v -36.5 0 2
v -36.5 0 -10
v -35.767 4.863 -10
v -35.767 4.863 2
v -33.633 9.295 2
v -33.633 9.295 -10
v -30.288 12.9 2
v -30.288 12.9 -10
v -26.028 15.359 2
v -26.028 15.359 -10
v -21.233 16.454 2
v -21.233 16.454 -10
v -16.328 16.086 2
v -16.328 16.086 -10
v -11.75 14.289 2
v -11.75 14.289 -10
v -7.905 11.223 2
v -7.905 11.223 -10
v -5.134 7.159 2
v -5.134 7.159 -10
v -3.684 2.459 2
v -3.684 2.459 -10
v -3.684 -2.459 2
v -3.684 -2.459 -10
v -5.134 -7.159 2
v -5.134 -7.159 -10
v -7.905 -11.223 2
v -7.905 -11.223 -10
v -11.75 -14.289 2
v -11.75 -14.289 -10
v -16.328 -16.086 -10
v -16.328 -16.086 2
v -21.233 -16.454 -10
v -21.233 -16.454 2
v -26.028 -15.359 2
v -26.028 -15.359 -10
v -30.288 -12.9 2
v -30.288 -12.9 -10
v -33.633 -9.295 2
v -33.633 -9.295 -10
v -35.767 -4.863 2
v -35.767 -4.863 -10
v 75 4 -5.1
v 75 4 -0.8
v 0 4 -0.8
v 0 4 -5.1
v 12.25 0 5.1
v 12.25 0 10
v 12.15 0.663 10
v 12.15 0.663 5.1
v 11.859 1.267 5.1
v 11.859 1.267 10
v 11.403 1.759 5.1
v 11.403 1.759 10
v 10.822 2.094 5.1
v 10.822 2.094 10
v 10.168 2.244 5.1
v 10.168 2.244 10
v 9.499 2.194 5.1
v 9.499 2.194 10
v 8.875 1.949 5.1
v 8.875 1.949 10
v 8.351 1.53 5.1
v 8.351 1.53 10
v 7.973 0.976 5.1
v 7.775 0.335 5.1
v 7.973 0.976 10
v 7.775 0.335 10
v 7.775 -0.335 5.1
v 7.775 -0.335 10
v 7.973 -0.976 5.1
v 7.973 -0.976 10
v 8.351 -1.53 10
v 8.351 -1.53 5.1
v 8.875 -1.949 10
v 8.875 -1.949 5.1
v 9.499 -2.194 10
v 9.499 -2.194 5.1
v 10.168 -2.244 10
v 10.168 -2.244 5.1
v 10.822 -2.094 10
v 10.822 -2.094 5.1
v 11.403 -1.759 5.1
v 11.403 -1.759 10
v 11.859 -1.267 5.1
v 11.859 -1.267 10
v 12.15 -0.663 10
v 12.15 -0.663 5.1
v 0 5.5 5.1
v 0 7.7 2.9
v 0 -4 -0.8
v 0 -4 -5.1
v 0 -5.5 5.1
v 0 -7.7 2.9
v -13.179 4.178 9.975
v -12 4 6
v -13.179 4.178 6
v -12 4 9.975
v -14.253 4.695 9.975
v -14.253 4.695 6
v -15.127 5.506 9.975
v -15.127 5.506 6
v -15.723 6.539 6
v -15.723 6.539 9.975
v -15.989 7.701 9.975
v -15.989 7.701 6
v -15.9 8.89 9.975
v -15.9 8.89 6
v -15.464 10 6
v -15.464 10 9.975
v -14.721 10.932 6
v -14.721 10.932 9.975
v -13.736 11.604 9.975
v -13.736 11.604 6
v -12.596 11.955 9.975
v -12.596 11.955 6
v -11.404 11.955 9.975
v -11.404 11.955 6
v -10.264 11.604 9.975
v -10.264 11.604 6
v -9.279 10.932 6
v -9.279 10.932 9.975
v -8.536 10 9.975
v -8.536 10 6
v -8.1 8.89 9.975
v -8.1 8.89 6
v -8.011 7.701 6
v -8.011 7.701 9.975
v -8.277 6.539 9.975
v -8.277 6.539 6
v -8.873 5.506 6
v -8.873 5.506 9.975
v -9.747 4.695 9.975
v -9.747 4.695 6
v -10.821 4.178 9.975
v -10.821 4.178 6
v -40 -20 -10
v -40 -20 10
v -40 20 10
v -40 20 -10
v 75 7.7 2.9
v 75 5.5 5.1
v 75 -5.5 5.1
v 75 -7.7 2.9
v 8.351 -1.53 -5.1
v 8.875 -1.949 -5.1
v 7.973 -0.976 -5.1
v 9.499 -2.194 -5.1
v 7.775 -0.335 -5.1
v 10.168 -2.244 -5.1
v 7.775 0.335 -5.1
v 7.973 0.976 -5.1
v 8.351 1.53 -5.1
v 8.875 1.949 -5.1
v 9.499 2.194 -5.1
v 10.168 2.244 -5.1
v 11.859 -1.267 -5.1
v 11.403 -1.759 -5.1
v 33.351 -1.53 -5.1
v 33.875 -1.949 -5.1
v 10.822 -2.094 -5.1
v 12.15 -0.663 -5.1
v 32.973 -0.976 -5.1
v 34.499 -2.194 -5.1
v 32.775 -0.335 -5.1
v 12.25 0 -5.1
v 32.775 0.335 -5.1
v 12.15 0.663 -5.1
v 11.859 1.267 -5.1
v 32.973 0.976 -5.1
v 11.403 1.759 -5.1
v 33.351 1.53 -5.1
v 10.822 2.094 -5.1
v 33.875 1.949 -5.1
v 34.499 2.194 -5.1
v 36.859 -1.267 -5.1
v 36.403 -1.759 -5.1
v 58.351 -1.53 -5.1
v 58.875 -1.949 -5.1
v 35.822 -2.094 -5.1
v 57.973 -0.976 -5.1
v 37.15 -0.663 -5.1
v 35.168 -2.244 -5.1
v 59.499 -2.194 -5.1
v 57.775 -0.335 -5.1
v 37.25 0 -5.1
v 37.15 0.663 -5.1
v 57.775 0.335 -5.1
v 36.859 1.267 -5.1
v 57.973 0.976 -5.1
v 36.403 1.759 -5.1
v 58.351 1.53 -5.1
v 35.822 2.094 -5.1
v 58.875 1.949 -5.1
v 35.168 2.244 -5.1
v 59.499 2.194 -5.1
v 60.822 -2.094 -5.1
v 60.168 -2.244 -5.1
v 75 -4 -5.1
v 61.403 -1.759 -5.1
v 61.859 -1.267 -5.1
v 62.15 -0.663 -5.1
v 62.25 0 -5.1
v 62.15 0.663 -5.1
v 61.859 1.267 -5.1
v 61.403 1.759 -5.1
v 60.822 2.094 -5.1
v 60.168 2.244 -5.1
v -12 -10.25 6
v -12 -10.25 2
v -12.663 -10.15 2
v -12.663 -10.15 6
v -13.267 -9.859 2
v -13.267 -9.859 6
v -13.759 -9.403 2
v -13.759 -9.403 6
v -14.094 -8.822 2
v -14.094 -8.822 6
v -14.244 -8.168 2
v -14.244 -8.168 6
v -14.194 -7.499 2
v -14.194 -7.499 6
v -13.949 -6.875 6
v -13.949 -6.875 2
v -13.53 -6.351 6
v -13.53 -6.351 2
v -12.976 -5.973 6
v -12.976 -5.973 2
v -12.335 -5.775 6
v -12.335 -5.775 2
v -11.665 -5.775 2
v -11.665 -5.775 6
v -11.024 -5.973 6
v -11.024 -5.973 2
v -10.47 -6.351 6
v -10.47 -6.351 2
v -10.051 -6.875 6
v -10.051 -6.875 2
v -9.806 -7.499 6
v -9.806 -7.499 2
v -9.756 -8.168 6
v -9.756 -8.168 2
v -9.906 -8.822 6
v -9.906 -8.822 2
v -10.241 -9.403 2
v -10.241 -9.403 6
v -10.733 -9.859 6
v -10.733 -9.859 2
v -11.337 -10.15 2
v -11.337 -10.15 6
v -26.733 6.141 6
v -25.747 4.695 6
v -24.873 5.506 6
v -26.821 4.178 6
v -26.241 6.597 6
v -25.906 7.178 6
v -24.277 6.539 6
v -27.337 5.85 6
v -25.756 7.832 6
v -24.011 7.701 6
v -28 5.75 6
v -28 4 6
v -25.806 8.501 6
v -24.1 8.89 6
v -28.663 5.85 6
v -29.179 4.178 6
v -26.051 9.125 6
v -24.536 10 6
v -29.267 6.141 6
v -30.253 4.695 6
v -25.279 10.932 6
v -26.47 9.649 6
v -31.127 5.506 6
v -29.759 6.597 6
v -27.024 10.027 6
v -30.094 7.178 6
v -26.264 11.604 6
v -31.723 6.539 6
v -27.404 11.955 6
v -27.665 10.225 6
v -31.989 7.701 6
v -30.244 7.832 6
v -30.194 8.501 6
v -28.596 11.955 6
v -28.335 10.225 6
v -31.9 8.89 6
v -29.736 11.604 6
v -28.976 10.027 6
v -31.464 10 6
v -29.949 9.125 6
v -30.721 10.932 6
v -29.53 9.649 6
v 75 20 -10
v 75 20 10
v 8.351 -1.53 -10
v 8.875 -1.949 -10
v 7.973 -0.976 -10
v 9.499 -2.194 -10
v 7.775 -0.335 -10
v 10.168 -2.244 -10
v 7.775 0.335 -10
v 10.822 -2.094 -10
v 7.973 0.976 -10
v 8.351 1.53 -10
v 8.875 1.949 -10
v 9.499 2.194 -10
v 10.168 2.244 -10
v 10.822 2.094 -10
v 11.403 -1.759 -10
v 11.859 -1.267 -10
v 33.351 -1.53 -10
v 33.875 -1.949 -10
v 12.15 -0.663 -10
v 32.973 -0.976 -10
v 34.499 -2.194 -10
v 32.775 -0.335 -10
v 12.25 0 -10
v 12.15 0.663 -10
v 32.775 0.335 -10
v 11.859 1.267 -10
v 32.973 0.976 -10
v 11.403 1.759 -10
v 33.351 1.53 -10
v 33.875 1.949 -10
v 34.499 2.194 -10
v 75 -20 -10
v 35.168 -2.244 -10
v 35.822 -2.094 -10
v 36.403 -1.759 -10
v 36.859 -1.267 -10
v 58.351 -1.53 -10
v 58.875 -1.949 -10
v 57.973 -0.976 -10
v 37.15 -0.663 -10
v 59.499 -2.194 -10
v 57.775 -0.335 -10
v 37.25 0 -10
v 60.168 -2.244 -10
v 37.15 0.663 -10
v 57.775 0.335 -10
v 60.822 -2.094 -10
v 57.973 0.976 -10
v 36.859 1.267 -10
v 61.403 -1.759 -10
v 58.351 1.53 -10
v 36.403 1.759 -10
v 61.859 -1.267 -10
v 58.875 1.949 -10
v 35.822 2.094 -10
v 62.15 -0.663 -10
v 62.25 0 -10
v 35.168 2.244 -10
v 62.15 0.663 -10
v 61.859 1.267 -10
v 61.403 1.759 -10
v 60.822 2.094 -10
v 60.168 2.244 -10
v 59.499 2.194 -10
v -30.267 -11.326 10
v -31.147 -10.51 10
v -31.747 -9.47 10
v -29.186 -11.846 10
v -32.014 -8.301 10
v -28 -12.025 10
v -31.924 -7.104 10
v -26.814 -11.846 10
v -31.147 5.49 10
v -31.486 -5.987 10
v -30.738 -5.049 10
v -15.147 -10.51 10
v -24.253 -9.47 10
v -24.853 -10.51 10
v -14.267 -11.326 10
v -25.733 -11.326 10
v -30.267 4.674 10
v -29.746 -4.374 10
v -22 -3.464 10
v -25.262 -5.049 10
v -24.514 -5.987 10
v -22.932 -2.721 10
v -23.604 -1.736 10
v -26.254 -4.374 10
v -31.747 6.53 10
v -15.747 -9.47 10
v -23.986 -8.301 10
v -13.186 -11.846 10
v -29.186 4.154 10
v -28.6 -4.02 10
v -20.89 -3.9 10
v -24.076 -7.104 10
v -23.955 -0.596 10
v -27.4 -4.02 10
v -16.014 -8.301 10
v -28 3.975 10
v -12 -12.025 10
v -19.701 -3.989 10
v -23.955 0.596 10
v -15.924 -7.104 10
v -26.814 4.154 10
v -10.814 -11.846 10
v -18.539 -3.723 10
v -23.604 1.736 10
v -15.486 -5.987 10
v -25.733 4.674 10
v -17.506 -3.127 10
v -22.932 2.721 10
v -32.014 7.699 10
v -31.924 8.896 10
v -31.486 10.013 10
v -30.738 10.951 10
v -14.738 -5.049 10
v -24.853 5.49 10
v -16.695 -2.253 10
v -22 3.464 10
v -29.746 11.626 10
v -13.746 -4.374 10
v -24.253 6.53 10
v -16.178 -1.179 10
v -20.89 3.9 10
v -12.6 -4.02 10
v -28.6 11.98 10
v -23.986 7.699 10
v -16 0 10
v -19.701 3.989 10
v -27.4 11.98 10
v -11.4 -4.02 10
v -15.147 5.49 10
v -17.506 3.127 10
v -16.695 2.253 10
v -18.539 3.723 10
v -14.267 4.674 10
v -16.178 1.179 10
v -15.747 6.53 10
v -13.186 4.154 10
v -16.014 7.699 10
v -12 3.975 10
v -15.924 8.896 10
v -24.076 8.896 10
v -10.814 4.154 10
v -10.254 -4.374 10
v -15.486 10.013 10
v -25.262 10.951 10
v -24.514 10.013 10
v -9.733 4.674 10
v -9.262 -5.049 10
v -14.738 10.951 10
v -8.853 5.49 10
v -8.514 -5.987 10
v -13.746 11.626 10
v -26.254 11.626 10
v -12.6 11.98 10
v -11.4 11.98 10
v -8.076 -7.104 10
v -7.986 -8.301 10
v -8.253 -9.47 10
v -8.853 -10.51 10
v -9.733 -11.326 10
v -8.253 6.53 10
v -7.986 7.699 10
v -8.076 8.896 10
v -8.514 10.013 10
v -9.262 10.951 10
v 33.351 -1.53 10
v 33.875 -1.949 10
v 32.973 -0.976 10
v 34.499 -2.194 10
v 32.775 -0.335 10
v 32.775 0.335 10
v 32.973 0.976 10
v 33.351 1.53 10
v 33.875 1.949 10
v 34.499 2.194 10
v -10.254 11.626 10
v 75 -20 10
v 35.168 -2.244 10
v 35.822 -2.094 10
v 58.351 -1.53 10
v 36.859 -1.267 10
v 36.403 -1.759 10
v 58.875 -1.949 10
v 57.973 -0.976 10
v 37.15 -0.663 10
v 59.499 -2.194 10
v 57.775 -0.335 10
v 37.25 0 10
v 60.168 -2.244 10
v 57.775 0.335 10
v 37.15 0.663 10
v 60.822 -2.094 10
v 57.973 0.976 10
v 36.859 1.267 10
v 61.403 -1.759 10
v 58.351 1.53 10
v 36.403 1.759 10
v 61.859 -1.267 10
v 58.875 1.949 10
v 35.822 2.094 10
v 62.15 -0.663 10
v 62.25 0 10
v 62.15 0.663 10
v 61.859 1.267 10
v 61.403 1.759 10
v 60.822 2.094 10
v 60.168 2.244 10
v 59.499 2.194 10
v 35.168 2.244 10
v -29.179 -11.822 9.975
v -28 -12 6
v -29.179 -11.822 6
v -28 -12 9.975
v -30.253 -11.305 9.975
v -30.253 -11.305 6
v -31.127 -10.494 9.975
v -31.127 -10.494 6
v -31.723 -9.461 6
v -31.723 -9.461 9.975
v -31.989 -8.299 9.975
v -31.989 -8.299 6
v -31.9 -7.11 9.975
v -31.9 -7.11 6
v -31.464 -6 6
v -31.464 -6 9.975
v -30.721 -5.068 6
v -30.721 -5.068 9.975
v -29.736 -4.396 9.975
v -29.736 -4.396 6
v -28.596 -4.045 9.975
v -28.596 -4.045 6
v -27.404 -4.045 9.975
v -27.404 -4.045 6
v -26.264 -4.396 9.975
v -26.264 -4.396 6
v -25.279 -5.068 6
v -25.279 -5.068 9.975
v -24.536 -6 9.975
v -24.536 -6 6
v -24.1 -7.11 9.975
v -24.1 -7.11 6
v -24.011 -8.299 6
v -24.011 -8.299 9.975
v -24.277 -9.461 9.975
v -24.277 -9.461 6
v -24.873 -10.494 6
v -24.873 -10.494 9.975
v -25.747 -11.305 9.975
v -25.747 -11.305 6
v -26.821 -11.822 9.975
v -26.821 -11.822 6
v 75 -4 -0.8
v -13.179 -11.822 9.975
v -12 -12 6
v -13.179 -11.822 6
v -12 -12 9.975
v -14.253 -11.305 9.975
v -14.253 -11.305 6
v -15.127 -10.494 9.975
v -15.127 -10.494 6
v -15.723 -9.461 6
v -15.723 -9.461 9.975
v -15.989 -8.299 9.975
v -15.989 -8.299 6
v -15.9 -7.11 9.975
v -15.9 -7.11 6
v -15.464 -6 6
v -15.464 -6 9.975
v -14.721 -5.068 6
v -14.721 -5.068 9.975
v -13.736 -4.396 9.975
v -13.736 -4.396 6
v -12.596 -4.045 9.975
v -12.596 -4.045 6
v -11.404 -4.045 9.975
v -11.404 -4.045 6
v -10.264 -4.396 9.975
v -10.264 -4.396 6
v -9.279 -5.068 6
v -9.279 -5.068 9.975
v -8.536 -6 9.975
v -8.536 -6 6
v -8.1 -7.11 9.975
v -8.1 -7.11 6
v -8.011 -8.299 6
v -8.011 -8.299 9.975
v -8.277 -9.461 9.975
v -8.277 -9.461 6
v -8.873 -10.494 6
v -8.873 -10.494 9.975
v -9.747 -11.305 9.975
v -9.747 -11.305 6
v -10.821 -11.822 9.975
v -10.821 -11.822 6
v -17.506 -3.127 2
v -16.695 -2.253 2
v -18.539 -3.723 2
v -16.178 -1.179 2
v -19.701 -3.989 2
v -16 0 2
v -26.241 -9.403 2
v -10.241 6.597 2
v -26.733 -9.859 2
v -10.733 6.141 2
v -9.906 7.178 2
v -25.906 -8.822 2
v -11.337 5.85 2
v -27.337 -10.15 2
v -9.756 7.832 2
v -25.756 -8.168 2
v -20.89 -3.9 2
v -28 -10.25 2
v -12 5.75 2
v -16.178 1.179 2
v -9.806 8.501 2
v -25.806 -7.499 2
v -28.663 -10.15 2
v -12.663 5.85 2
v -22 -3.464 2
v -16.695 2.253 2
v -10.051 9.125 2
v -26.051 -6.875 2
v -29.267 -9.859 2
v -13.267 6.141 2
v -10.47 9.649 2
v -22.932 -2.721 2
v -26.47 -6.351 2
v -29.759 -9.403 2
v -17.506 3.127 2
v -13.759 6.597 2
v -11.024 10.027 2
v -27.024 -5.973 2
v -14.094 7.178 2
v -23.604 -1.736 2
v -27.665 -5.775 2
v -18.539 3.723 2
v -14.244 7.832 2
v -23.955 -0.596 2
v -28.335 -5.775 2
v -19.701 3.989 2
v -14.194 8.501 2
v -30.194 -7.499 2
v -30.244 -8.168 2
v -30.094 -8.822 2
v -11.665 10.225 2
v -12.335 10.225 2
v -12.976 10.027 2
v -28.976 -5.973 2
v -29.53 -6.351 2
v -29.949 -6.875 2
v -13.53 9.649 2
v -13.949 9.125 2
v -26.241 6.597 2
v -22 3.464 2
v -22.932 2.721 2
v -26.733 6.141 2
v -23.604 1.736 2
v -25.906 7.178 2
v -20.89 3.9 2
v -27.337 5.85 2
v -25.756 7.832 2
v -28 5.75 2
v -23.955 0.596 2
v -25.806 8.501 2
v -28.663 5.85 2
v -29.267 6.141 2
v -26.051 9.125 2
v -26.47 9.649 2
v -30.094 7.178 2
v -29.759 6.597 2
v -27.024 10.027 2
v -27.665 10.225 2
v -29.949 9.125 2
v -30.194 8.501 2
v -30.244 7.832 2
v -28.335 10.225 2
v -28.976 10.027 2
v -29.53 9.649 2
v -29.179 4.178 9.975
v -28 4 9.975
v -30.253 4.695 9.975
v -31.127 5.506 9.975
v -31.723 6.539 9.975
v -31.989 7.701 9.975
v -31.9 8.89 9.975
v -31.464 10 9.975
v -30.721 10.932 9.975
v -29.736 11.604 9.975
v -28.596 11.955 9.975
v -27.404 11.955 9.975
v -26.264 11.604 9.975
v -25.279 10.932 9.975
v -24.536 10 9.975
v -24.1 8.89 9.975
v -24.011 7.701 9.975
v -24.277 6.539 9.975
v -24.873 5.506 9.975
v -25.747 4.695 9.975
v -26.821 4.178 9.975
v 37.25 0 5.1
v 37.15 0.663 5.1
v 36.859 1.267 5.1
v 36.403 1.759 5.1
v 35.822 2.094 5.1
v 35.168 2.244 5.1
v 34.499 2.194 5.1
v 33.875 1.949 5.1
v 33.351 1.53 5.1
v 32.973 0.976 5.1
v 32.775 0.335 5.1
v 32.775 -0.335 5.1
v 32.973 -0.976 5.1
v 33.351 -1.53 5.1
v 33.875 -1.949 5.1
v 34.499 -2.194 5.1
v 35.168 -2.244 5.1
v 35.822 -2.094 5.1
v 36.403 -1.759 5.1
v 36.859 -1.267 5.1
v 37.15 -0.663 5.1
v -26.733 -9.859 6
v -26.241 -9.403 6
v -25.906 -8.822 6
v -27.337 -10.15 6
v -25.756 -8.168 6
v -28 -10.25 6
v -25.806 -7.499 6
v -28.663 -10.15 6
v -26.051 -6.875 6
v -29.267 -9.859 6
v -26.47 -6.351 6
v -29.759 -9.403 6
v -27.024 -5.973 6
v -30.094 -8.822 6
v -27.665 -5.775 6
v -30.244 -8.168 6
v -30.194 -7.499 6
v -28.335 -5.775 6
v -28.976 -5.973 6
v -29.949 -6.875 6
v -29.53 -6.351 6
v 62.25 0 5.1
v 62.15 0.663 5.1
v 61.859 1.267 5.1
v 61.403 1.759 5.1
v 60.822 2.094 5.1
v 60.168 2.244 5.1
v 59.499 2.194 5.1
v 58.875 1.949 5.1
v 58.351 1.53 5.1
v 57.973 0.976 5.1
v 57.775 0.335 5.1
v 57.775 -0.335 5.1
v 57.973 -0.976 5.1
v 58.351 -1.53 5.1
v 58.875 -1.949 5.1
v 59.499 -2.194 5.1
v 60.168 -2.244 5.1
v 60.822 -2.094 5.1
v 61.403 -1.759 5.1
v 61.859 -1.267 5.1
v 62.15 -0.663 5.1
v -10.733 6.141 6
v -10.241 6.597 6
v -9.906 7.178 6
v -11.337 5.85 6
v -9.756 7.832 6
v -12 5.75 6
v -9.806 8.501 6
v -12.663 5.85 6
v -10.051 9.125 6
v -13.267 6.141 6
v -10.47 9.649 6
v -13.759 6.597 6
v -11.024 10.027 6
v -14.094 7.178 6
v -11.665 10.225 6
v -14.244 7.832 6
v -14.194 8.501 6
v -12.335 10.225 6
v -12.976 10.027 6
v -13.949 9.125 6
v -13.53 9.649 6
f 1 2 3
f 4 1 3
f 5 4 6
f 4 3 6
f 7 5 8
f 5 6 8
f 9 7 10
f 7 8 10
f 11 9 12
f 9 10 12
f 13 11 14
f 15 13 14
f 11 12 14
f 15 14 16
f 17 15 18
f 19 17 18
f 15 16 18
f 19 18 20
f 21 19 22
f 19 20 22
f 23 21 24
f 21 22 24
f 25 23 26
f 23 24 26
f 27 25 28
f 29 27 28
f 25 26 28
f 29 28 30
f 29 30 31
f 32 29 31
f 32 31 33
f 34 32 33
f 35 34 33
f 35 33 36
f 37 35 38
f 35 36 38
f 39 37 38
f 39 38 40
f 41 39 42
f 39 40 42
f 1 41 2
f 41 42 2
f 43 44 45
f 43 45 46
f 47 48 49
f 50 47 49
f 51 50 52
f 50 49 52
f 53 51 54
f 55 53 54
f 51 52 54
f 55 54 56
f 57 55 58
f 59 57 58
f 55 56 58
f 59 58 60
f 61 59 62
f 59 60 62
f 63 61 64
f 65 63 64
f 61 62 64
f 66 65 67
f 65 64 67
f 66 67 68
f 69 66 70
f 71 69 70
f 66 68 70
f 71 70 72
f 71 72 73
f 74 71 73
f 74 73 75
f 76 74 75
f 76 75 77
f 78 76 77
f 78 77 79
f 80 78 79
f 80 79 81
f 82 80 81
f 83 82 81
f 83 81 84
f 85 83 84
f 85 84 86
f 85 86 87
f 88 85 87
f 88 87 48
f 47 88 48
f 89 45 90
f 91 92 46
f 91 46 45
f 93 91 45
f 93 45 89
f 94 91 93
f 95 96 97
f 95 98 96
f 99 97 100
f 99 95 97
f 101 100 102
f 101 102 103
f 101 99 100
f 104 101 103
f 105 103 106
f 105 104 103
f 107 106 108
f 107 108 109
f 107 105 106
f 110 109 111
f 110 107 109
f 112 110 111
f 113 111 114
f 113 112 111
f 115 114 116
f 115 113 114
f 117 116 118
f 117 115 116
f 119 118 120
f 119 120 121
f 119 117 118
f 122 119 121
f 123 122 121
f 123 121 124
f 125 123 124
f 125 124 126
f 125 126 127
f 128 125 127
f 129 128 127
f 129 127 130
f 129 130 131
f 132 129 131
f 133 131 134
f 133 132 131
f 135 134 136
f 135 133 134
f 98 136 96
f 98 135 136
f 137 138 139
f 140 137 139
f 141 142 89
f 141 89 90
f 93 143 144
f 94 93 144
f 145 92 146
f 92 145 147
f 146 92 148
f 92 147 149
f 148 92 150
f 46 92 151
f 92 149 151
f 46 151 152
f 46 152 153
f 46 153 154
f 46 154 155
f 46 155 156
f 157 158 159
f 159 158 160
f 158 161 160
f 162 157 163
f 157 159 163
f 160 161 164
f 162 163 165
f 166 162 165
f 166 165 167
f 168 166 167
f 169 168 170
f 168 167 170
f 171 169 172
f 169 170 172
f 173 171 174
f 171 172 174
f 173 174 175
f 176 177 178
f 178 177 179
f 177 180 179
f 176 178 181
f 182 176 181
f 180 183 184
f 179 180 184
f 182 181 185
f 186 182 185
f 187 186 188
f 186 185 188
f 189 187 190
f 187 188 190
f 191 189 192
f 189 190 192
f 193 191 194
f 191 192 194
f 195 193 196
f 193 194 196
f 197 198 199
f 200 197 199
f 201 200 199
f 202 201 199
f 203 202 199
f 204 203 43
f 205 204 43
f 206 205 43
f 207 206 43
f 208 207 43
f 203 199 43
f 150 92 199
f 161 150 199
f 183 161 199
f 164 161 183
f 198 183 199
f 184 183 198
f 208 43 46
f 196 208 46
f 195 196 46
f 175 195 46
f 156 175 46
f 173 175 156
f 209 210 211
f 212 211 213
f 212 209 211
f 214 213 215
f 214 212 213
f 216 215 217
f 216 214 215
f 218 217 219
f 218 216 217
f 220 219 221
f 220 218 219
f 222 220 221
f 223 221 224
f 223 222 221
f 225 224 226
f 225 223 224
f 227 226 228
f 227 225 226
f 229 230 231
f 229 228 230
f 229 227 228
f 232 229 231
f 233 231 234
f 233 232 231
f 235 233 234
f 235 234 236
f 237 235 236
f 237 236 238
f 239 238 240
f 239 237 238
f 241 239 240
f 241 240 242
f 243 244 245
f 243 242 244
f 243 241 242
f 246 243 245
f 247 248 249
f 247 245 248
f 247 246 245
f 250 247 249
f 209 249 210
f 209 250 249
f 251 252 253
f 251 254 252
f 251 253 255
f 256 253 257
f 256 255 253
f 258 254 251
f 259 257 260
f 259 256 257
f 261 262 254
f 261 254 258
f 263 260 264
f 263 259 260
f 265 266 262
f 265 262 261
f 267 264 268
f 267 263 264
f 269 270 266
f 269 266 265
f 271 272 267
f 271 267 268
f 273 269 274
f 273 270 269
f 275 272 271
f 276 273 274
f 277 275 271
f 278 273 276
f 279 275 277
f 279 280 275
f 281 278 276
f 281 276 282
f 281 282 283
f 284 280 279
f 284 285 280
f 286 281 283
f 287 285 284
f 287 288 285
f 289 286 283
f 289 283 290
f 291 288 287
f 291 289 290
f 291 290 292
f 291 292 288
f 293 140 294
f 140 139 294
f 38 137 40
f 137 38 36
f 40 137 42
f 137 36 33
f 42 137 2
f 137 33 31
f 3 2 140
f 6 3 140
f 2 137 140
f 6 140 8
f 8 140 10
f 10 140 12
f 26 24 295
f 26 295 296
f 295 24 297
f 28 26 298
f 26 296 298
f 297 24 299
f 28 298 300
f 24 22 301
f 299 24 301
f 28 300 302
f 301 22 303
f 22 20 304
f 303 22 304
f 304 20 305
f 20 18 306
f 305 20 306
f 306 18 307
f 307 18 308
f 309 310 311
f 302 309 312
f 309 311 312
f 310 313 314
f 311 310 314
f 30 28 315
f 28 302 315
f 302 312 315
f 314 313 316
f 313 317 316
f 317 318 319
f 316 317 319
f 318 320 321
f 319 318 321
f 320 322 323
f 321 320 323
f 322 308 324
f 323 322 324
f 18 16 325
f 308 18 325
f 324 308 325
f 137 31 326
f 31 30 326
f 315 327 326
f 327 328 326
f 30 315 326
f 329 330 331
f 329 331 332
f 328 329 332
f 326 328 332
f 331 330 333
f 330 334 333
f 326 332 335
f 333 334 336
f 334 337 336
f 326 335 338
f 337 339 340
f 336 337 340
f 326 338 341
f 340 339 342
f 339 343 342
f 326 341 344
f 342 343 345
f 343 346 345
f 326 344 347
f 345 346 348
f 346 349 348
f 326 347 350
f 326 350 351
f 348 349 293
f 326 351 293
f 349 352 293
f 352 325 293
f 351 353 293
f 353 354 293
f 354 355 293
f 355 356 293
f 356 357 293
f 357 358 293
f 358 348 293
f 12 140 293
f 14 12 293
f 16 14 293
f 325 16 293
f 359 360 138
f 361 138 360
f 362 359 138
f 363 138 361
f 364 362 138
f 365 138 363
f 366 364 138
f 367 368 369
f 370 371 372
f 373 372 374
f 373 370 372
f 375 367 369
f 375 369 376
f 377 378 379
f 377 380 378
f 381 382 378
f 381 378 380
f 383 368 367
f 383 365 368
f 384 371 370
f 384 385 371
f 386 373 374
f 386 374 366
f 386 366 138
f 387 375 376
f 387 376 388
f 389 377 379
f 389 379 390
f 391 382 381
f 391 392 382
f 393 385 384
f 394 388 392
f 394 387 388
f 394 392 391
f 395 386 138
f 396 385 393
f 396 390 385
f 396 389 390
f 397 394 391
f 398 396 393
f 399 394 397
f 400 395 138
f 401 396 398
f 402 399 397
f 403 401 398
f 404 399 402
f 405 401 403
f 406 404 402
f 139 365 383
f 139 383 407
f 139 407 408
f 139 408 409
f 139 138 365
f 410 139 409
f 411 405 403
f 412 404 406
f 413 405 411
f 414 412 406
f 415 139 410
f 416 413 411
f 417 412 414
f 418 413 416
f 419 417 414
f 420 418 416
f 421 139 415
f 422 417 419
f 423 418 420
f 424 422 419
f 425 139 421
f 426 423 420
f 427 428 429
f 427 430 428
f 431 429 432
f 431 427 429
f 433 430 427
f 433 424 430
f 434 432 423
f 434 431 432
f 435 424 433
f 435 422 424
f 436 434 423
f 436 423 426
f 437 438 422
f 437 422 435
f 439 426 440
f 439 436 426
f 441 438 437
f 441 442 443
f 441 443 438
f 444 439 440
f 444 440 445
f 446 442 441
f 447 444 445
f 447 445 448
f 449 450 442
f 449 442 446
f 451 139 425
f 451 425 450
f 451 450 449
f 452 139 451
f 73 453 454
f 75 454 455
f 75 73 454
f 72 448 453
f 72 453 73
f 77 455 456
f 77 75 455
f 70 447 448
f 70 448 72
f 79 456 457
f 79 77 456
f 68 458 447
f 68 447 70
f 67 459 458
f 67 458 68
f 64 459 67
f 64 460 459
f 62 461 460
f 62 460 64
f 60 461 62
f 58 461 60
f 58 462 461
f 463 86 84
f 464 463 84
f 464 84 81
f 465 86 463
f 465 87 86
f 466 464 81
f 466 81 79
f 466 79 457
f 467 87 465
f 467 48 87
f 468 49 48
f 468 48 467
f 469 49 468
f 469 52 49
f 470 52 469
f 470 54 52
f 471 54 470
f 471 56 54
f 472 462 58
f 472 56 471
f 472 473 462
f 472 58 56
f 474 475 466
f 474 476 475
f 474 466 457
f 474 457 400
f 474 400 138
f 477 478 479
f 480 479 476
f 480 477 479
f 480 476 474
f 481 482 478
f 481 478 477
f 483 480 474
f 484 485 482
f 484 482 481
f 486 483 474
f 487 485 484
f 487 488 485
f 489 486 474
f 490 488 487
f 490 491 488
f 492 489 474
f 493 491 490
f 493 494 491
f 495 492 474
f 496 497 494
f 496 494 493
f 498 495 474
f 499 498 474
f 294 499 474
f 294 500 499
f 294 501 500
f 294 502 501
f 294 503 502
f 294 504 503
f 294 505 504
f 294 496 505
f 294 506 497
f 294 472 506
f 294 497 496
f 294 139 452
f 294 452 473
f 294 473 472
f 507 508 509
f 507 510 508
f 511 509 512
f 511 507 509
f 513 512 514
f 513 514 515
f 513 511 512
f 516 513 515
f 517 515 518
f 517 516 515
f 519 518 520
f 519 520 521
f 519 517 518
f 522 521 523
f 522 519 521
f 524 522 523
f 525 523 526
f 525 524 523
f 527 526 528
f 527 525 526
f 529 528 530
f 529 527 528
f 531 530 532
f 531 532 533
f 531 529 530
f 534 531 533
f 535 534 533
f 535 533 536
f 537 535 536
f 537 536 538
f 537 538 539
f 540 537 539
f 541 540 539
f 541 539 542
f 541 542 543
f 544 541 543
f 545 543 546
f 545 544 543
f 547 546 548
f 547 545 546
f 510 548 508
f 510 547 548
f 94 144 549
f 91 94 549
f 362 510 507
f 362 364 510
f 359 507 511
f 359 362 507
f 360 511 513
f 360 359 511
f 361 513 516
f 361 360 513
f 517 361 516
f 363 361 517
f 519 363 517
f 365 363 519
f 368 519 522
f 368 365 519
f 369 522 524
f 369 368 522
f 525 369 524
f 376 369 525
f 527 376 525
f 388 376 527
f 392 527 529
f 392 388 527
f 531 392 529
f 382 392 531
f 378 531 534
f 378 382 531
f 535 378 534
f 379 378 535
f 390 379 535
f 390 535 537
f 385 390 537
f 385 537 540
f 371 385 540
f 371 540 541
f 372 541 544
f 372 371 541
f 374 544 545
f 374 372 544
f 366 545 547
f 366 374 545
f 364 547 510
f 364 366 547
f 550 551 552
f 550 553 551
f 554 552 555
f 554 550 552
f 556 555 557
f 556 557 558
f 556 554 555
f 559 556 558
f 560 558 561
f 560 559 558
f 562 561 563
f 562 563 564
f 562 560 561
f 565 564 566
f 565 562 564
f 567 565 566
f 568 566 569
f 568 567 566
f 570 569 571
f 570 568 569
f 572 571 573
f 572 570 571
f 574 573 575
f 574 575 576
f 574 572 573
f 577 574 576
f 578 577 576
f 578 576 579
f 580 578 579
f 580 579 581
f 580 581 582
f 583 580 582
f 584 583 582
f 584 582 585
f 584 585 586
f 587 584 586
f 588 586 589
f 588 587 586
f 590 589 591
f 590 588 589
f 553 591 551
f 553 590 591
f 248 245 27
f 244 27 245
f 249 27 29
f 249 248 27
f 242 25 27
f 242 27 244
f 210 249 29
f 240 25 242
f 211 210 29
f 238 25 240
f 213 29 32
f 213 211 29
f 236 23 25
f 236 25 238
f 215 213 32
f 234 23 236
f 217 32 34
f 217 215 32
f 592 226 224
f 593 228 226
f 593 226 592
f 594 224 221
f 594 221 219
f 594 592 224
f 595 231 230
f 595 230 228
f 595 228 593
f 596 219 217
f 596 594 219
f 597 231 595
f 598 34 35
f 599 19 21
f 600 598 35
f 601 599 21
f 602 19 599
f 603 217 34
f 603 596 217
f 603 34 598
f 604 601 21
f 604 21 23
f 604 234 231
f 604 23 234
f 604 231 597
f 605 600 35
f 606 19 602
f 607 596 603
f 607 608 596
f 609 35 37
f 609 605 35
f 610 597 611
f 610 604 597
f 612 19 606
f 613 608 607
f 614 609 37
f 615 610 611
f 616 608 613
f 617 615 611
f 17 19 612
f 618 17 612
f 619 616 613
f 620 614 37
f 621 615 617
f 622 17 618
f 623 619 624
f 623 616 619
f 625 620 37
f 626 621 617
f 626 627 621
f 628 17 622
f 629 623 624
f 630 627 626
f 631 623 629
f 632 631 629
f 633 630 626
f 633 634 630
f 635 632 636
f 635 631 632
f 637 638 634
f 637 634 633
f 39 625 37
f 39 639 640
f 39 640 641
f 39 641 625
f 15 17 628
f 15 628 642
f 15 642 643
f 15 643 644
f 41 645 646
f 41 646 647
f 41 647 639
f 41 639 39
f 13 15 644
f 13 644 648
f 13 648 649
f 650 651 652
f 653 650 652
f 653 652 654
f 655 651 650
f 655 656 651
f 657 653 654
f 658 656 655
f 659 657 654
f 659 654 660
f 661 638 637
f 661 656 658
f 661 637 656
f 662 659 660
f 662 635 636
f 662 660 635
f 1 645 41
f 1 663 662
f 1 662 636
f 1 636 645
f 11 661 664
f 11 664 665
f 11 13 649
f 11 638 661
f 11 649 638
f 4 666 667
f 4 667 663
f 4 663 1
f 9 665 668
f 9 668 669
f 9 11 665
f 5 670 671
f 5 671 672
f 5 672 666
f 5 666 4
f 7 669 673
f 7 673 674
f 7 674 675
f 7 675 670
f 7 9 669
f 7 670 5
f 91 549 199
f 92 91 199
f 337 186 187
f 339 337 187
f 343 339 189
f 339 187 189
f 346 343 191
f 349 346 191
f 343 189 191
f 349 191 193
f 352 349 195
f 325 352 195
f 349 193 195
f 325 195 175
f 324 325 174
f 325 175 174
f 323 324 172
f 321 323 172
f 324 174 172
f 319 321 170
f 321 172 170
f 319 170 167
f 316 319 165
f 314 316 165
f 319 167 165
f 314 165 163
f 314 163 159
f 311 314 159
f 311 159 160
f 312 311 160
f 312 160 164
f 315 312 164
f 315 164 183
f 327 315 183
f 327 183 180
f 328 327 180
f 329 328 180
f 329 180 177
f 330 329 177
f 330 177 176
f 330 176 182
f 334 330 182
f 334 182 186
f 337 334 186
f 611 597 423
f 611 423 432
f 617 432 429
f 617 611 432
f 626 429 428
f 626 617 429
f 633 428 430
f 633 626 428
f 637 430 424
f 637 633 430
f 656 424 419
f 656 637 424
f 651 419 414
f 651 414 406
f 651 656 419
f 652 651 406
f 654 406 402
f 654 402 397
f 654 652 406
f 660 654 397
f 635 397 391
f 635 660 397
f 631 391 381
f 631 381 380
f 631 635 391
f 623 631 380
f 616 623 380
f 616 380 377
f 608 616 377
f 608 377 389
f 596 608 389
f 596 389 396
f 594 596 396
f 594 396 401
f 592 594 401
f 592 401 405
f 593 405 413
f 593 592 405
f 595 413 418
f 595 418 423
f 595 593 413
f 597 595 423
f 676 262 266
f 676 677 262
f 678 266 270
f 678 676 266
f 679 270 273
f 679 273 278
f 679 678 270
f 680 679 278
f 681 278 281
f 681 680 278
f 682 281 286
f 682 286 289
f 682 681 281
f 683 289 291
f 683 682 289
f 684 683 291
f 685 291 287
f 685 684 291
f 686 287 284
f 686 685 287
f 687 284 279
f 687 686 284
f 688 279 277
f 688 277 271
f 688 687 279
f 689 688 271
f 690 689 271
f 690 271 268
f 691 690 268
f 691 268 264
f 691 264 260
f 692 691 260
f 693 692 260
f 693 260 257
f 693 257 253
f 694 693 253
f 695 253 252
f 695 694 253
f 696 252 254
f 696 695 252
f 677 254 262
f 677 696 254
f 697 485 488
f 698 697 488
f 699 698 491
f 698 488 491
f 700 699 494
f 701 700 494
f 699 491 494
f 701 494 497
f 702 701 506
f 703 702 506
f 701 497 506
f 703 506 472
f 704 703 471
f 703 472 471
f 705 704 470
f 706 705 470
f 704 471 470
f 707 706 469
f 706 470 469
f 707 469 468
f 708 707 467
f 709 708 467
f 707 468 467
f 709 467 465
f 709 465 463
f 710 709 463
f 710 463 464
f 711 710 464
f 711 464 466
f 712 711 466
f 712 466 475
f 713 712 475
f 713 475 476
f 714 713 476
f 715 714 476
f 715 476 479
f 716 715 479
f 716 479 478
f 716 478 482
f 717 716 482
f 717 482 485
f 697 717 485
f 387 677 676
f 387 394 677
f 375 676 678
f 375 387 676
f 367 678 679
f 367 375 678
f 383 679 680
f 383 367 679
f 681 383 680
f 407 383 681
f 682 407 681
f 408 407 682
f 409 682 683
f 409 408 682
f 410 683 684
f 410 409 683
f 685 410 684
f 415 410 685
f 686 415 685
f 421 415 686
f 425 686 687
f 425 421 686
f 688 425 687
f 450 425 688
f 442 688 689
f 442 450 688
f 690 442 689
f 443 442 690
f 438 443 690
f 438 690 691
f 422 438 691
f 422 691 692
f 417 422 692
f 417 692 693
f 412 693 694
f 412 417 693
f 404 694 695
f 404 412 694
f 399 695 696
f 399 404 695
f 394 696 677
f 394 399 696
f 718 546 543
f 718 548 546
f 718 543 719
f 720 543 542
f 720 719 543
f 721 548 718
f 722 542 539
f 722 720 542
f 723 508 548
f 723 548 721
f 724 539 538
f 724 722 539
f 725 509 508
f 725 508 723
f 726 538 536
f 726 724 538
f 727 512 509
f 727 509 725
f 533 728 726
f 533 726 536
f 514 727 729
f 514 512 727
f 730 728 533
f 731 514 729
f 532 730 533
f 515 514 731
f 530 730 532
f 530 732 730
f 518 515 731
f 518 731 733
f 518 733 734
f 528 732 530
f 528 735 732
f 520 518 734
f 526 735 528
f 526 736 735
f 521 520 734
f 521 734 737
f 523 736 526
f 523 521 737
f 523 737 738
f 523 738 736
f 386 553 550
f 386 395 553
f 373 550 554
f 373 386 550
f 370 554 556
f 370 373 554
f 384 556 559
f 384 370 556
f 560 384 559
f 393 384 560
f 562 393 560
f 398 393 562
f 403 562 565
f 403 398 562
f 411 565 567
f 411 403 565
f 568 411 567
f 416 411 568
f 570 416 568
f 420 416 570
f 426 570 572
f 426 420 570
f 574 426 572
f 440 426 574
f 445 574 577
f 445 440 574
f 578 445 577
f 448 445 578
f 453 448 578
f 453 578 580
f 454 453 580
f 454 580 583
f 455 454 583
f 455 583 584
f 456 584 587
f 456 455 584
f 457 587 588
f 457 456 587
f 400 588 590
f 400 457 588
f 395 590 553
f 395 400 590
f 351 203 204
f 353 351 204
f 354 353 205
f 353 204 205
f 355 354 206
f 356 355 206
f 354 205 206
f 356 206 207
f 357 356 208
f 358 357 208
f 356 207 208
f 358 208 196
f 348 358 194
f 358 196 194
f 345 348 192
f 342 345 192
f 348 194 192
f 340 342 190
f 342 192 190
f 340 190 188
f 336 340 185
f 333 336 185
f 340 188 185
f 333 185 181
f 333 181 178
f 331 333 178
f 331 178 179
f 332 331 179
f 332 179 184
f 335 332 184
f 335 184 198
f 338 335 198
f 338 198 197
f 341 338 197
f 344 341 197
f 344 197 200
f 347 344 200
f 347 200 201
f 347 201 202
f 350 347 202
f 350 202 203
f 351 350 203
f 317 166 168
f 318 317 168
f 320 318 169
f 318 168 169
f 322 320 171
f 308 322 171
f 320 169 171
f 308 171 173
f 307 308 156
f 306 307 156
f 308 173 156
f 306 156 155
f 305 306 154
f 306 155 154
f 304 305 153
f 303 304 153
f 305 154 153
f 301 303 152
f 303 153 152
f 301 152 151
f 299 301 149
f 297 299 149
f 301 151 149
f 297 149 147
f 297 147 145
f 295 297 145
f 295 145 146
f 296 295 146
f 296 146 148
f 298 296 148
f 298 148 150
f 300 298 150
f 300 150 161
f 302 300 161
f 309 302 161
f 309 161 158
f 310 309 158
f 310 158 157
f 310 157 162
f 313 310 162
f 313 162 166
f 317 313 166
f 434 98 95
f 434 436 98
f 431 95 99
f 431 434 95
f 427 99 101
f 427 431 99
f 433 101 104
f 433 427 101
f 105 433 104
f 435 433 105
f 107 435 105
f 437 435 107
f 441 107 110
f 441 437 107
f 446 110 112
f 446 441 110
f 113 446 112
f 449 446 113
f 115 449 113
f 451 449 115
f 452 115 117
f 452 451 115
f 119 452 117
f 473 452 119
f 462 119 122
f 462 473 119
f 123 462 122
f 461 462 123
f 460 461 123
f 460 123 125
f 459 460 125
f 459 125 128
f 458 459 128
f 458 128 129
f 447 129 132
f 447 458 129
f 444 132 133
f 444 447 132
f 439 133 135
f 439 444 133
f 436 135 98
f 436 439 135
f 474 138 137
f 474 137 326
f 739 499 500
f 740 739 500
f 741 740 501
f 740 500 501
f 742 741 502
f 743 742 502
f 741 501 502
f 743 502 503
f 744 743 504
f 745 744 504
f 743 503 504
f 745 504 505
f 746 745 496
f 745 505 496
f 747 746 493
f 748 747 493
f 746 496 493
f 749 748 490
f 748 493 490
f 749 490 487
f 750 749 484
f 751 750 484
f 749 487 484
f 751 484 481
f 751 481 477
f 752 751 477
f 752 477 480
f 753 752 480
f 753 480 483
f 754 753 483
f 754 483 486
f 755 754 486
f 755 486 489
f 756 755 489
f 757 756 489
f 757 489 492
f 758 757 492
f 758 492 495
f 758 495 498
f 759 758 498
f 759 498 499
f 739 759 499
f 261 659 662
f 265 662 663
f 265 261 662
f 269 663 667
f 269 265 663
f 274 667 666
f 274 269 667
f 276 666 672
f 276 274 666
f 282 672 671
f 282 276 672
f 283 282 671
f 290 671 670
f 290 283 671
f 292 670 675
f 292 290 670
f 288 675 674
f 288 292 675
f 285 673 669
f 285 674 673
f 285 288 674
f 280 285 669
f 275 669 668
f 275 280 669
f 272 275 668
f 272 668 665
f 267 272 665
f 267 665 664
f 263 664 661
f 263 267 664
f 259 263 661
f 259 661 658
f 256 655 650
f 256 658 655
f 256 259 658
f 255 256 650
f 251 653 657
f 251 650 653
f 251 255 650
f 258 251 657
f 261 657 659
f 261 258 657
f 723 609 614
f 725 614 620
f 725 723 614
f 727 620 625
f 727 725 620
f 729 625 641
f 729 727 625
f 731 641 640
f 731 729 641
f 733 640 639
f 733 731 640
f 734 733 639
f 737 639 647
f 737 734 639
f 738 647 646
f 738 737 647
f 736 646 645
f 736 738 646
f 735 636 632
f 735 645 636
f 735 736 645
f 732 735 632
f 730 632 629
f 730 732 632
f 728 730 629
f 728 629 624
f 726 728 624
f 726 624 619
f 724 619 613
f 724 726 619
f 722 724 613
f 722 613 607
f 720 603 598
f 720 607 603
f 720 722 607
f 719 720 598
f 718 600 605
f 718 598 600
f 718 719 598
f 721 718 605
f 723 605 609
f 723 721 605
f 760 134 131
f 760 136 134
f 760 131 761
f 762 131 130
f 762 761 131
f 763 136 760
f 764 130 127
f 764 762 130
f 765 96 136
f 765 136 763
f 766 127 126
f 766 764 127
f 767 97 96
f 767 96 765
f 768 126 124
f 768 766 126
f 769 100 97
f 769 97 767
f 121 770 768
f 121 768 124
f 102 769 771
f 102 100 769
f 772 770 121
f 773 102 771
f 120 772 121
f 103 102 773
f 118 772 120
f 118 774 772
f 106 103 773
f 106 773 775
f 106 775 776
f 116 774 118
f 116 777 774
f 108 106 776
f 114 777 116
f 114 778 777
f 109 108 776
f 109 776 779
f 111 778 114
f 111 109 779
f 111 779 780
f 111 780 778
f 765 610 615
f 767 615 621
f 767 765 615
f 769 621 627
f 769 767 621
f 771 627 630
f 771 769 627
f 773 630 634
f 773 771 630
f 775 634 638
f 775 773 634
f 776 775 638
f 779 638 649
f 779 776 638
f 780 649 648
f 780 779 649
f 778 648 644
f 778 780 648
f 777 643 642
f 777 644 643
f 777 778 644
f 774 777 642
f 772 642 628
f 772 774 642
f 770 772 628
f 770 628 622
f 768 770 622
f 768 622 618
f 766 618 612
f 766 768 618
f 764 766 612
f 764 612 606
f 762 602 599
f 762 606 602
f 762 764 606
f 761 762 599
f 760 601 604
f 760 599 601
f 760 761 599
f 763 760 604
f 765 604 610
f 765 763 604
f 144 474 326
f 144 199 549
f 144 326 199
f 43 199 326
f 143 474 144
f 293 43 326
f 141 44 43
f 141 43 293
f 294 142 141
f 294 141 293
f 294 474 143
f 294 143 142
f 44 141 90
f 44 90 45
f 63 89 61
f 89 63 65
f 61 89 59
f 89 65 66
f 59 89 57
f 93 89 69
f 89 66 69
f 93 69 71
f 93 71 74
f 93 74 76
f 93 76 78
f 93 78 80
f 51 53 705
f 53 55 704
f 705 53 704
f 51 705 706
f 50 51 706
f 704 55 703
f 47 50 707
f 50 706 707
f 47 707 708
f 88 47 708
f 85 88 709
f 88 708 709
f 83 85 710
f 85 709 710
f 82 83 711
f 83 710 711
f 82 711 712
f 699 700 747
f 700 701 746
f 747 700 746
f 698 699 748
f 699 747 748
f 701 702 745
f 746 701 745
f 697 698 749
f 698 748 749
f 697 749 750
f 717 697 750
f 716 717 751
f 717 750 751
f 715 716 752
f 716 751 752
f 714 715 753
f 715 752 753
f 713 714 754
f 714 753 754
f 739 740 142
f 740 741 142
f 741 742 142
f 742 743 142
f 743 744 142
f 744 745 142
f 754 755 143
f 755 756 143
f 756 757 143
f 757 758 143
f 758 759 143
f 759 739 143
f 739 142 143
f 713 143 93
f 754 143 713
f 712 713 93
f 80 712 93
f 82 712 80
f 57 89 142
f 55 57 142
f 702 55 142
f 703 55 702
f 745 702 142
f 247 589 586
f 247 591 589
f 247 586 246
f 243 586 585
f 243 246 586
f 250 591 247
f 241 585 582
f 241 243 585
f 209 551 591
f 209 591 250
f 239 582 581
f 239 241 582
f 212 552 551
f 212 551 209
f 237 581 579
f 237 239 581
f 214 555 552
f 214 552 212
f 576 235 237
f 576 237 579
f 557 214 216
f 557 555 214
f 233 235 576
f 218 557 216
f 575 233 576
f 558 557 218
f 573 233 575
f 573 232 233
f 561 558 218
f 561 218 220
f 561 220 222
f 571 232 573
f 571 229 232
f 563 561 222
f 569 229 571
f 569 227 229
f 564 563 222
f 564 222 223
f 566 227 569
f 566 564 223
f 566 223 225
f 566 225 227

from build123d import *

# Parameters (mm, degrees)
SKETCH1_W                     = 115
SKETCH1_H                     = 40
SKETCH1_R                     = 4
BOSS_EXTRUDE1_DEPTH           = 10
CBORE_FOR_M4_SHCS1_AT_2_COUNT = 2
CBORE_FOR_M4_SHCS1_AT_2_PITCH = 16
CBORE_FOR_M4_SHCS1_AT_3_COUNT = 2
CBORE_FOR_M4_SHCS1_AT_3_PITCH = 16
CBORE_FOR_M4_SHCS1_AT_4_COUNT = 2
CBORE_FOR_M4_SHCS1_AT_4_PITCH = 22.627416998
SKETCH5_R                     = 16.5
SKETCH5_R_2                   = 4
CUT_EXTRUDE1_DEPTH            = 12
CUT_EXTRUDE2_DEPTH            = 75
M4_CLEARANCE_HOLE1_D          = 4.5


with BuildPart() as part:
    # Sketch1 → Boss-Extrude1 (new body, symmetric)
    with BuildSketch(Plane.XY):
        with Locations((17.5, 0)):
            Rectangle(SKETCH1_W, SKETCH1_H)
        with Locations((-20, 0)):
            Circle(SKETCH1_R, mode=Mode.SUBTRACT)
    extrude(amount=BOSS_EXTRUDE1_DEPTH, both=True)

    # Sketch3 → CBORE for M4 SHCS1 (revolve, cut)
    with BuildSketch(Plane(origin=(-28, 8, 10), x_dir=(0, -1, 0), z_dir=(1, 0, 0))):
        Polygon((0, 0), (0, 20), (2.25, 20), (2.25, 4), (4, 4), (4, 0.025), (4.025, 0), align=None)
    cbore_for_m4_shcs1 = revolve(axis=Axis((-28, 8, 16.35), (0, 0, -1)), mode=Mode.SUBTRACT)

    # CBORE for M4 SHCS1 at 2: CBORE for M4 SHCS1 ×2
    with Locations(*[(i * CBORE_FOR_M4_SHCS1_AT_2_PITCH, 0, 0) for i in range(1, CBORE_FOR_M4_SHCS1_AT_2_COUNT)]):
        add(cbore_for_m4_shcs1, mode=Mode.SUBTRACT)

    # CBORE for M4 SHCS1 at 3: CBORE for M4 SHCS1 ×2
    with Locations(*[(0, -i * CBORE_FOR_M4_SHCS1_AT_3_PITCH, 0) for i in range(1, CBORE_FOR_M4_SHCS1_AT_3_COUNT)]):
        add(cbore_for_m4_shcs1, mode=Mode.SUBTRACT)

    # CBORE for M4 SHCS1 at 4: CBORE for M4 SHCS1 ×2
    with Locations(*[Vector(0.707106781, -0.707106781, 0) * (i * CBORE_FOR_M4_SHCS1_AT_4_PITCH) for i in range(1, CBORE_FOR_M4_SHCS1_AT_4_COUNT)]):
        add(cbore_for_m4_shcs1, mode=Mode.SUBTRACT)

    # Sketch5 → Cut-Extrude1 (cut)
    with BuildSketch(Plane(origin=(0, 0, -10), x_dir=(-1, 0, 0), z_dir=(0, 0, -1))):
        with Locations((20, 0)):
            Circle(SKETCH5_R)
        with Locations((20, 0)):
            Circle(SKETCH5_R_2, mode=Mode.SUBTRACT)
    extrude(amount=-CUT_EXTRUDE1_DEPTH, mode=Mode.SUBTRACT)

    # Sketch6 → Cut-Extrude2 (cut)
    with BuildSketch(Plane(origin=(75, 0, 0), x_dir=(0, 0, -1), z_dir=(1, 0, 0))):
        Polygon((-5.1, 5.5), (-2.9, 7.7), (0.8, 4), (5.1, 4), (5.1, 0), (-5.1, 0), align=None)
    cut_extrude2 = extrude(amount=-CUT_EXTRUDE2_DEPTH, mode=Mode.SUBTRACT)

    # Mirror1: Cut-Extrude2 across plane
    add(cut_extrude2.mirror(Plane(origin=(-12.780062598, 0, 5.1), x_dir=(0, 0, 1), z_dir=(0, -1, 0))), mode=Mode.SUBTRACT)

    # M4 Clearance Hole1 (through all)
    with Locations(Plane(origin=(0, 0, -10), x_dir=(-1, 0, 0), z_dir=(0, 0, -1))):
        with Locations((-10, 0), (-35, 0), (-60, 0)):
            Hole(M4_CLEARANCE_HOLE1_D / 2)


solid = part.part
